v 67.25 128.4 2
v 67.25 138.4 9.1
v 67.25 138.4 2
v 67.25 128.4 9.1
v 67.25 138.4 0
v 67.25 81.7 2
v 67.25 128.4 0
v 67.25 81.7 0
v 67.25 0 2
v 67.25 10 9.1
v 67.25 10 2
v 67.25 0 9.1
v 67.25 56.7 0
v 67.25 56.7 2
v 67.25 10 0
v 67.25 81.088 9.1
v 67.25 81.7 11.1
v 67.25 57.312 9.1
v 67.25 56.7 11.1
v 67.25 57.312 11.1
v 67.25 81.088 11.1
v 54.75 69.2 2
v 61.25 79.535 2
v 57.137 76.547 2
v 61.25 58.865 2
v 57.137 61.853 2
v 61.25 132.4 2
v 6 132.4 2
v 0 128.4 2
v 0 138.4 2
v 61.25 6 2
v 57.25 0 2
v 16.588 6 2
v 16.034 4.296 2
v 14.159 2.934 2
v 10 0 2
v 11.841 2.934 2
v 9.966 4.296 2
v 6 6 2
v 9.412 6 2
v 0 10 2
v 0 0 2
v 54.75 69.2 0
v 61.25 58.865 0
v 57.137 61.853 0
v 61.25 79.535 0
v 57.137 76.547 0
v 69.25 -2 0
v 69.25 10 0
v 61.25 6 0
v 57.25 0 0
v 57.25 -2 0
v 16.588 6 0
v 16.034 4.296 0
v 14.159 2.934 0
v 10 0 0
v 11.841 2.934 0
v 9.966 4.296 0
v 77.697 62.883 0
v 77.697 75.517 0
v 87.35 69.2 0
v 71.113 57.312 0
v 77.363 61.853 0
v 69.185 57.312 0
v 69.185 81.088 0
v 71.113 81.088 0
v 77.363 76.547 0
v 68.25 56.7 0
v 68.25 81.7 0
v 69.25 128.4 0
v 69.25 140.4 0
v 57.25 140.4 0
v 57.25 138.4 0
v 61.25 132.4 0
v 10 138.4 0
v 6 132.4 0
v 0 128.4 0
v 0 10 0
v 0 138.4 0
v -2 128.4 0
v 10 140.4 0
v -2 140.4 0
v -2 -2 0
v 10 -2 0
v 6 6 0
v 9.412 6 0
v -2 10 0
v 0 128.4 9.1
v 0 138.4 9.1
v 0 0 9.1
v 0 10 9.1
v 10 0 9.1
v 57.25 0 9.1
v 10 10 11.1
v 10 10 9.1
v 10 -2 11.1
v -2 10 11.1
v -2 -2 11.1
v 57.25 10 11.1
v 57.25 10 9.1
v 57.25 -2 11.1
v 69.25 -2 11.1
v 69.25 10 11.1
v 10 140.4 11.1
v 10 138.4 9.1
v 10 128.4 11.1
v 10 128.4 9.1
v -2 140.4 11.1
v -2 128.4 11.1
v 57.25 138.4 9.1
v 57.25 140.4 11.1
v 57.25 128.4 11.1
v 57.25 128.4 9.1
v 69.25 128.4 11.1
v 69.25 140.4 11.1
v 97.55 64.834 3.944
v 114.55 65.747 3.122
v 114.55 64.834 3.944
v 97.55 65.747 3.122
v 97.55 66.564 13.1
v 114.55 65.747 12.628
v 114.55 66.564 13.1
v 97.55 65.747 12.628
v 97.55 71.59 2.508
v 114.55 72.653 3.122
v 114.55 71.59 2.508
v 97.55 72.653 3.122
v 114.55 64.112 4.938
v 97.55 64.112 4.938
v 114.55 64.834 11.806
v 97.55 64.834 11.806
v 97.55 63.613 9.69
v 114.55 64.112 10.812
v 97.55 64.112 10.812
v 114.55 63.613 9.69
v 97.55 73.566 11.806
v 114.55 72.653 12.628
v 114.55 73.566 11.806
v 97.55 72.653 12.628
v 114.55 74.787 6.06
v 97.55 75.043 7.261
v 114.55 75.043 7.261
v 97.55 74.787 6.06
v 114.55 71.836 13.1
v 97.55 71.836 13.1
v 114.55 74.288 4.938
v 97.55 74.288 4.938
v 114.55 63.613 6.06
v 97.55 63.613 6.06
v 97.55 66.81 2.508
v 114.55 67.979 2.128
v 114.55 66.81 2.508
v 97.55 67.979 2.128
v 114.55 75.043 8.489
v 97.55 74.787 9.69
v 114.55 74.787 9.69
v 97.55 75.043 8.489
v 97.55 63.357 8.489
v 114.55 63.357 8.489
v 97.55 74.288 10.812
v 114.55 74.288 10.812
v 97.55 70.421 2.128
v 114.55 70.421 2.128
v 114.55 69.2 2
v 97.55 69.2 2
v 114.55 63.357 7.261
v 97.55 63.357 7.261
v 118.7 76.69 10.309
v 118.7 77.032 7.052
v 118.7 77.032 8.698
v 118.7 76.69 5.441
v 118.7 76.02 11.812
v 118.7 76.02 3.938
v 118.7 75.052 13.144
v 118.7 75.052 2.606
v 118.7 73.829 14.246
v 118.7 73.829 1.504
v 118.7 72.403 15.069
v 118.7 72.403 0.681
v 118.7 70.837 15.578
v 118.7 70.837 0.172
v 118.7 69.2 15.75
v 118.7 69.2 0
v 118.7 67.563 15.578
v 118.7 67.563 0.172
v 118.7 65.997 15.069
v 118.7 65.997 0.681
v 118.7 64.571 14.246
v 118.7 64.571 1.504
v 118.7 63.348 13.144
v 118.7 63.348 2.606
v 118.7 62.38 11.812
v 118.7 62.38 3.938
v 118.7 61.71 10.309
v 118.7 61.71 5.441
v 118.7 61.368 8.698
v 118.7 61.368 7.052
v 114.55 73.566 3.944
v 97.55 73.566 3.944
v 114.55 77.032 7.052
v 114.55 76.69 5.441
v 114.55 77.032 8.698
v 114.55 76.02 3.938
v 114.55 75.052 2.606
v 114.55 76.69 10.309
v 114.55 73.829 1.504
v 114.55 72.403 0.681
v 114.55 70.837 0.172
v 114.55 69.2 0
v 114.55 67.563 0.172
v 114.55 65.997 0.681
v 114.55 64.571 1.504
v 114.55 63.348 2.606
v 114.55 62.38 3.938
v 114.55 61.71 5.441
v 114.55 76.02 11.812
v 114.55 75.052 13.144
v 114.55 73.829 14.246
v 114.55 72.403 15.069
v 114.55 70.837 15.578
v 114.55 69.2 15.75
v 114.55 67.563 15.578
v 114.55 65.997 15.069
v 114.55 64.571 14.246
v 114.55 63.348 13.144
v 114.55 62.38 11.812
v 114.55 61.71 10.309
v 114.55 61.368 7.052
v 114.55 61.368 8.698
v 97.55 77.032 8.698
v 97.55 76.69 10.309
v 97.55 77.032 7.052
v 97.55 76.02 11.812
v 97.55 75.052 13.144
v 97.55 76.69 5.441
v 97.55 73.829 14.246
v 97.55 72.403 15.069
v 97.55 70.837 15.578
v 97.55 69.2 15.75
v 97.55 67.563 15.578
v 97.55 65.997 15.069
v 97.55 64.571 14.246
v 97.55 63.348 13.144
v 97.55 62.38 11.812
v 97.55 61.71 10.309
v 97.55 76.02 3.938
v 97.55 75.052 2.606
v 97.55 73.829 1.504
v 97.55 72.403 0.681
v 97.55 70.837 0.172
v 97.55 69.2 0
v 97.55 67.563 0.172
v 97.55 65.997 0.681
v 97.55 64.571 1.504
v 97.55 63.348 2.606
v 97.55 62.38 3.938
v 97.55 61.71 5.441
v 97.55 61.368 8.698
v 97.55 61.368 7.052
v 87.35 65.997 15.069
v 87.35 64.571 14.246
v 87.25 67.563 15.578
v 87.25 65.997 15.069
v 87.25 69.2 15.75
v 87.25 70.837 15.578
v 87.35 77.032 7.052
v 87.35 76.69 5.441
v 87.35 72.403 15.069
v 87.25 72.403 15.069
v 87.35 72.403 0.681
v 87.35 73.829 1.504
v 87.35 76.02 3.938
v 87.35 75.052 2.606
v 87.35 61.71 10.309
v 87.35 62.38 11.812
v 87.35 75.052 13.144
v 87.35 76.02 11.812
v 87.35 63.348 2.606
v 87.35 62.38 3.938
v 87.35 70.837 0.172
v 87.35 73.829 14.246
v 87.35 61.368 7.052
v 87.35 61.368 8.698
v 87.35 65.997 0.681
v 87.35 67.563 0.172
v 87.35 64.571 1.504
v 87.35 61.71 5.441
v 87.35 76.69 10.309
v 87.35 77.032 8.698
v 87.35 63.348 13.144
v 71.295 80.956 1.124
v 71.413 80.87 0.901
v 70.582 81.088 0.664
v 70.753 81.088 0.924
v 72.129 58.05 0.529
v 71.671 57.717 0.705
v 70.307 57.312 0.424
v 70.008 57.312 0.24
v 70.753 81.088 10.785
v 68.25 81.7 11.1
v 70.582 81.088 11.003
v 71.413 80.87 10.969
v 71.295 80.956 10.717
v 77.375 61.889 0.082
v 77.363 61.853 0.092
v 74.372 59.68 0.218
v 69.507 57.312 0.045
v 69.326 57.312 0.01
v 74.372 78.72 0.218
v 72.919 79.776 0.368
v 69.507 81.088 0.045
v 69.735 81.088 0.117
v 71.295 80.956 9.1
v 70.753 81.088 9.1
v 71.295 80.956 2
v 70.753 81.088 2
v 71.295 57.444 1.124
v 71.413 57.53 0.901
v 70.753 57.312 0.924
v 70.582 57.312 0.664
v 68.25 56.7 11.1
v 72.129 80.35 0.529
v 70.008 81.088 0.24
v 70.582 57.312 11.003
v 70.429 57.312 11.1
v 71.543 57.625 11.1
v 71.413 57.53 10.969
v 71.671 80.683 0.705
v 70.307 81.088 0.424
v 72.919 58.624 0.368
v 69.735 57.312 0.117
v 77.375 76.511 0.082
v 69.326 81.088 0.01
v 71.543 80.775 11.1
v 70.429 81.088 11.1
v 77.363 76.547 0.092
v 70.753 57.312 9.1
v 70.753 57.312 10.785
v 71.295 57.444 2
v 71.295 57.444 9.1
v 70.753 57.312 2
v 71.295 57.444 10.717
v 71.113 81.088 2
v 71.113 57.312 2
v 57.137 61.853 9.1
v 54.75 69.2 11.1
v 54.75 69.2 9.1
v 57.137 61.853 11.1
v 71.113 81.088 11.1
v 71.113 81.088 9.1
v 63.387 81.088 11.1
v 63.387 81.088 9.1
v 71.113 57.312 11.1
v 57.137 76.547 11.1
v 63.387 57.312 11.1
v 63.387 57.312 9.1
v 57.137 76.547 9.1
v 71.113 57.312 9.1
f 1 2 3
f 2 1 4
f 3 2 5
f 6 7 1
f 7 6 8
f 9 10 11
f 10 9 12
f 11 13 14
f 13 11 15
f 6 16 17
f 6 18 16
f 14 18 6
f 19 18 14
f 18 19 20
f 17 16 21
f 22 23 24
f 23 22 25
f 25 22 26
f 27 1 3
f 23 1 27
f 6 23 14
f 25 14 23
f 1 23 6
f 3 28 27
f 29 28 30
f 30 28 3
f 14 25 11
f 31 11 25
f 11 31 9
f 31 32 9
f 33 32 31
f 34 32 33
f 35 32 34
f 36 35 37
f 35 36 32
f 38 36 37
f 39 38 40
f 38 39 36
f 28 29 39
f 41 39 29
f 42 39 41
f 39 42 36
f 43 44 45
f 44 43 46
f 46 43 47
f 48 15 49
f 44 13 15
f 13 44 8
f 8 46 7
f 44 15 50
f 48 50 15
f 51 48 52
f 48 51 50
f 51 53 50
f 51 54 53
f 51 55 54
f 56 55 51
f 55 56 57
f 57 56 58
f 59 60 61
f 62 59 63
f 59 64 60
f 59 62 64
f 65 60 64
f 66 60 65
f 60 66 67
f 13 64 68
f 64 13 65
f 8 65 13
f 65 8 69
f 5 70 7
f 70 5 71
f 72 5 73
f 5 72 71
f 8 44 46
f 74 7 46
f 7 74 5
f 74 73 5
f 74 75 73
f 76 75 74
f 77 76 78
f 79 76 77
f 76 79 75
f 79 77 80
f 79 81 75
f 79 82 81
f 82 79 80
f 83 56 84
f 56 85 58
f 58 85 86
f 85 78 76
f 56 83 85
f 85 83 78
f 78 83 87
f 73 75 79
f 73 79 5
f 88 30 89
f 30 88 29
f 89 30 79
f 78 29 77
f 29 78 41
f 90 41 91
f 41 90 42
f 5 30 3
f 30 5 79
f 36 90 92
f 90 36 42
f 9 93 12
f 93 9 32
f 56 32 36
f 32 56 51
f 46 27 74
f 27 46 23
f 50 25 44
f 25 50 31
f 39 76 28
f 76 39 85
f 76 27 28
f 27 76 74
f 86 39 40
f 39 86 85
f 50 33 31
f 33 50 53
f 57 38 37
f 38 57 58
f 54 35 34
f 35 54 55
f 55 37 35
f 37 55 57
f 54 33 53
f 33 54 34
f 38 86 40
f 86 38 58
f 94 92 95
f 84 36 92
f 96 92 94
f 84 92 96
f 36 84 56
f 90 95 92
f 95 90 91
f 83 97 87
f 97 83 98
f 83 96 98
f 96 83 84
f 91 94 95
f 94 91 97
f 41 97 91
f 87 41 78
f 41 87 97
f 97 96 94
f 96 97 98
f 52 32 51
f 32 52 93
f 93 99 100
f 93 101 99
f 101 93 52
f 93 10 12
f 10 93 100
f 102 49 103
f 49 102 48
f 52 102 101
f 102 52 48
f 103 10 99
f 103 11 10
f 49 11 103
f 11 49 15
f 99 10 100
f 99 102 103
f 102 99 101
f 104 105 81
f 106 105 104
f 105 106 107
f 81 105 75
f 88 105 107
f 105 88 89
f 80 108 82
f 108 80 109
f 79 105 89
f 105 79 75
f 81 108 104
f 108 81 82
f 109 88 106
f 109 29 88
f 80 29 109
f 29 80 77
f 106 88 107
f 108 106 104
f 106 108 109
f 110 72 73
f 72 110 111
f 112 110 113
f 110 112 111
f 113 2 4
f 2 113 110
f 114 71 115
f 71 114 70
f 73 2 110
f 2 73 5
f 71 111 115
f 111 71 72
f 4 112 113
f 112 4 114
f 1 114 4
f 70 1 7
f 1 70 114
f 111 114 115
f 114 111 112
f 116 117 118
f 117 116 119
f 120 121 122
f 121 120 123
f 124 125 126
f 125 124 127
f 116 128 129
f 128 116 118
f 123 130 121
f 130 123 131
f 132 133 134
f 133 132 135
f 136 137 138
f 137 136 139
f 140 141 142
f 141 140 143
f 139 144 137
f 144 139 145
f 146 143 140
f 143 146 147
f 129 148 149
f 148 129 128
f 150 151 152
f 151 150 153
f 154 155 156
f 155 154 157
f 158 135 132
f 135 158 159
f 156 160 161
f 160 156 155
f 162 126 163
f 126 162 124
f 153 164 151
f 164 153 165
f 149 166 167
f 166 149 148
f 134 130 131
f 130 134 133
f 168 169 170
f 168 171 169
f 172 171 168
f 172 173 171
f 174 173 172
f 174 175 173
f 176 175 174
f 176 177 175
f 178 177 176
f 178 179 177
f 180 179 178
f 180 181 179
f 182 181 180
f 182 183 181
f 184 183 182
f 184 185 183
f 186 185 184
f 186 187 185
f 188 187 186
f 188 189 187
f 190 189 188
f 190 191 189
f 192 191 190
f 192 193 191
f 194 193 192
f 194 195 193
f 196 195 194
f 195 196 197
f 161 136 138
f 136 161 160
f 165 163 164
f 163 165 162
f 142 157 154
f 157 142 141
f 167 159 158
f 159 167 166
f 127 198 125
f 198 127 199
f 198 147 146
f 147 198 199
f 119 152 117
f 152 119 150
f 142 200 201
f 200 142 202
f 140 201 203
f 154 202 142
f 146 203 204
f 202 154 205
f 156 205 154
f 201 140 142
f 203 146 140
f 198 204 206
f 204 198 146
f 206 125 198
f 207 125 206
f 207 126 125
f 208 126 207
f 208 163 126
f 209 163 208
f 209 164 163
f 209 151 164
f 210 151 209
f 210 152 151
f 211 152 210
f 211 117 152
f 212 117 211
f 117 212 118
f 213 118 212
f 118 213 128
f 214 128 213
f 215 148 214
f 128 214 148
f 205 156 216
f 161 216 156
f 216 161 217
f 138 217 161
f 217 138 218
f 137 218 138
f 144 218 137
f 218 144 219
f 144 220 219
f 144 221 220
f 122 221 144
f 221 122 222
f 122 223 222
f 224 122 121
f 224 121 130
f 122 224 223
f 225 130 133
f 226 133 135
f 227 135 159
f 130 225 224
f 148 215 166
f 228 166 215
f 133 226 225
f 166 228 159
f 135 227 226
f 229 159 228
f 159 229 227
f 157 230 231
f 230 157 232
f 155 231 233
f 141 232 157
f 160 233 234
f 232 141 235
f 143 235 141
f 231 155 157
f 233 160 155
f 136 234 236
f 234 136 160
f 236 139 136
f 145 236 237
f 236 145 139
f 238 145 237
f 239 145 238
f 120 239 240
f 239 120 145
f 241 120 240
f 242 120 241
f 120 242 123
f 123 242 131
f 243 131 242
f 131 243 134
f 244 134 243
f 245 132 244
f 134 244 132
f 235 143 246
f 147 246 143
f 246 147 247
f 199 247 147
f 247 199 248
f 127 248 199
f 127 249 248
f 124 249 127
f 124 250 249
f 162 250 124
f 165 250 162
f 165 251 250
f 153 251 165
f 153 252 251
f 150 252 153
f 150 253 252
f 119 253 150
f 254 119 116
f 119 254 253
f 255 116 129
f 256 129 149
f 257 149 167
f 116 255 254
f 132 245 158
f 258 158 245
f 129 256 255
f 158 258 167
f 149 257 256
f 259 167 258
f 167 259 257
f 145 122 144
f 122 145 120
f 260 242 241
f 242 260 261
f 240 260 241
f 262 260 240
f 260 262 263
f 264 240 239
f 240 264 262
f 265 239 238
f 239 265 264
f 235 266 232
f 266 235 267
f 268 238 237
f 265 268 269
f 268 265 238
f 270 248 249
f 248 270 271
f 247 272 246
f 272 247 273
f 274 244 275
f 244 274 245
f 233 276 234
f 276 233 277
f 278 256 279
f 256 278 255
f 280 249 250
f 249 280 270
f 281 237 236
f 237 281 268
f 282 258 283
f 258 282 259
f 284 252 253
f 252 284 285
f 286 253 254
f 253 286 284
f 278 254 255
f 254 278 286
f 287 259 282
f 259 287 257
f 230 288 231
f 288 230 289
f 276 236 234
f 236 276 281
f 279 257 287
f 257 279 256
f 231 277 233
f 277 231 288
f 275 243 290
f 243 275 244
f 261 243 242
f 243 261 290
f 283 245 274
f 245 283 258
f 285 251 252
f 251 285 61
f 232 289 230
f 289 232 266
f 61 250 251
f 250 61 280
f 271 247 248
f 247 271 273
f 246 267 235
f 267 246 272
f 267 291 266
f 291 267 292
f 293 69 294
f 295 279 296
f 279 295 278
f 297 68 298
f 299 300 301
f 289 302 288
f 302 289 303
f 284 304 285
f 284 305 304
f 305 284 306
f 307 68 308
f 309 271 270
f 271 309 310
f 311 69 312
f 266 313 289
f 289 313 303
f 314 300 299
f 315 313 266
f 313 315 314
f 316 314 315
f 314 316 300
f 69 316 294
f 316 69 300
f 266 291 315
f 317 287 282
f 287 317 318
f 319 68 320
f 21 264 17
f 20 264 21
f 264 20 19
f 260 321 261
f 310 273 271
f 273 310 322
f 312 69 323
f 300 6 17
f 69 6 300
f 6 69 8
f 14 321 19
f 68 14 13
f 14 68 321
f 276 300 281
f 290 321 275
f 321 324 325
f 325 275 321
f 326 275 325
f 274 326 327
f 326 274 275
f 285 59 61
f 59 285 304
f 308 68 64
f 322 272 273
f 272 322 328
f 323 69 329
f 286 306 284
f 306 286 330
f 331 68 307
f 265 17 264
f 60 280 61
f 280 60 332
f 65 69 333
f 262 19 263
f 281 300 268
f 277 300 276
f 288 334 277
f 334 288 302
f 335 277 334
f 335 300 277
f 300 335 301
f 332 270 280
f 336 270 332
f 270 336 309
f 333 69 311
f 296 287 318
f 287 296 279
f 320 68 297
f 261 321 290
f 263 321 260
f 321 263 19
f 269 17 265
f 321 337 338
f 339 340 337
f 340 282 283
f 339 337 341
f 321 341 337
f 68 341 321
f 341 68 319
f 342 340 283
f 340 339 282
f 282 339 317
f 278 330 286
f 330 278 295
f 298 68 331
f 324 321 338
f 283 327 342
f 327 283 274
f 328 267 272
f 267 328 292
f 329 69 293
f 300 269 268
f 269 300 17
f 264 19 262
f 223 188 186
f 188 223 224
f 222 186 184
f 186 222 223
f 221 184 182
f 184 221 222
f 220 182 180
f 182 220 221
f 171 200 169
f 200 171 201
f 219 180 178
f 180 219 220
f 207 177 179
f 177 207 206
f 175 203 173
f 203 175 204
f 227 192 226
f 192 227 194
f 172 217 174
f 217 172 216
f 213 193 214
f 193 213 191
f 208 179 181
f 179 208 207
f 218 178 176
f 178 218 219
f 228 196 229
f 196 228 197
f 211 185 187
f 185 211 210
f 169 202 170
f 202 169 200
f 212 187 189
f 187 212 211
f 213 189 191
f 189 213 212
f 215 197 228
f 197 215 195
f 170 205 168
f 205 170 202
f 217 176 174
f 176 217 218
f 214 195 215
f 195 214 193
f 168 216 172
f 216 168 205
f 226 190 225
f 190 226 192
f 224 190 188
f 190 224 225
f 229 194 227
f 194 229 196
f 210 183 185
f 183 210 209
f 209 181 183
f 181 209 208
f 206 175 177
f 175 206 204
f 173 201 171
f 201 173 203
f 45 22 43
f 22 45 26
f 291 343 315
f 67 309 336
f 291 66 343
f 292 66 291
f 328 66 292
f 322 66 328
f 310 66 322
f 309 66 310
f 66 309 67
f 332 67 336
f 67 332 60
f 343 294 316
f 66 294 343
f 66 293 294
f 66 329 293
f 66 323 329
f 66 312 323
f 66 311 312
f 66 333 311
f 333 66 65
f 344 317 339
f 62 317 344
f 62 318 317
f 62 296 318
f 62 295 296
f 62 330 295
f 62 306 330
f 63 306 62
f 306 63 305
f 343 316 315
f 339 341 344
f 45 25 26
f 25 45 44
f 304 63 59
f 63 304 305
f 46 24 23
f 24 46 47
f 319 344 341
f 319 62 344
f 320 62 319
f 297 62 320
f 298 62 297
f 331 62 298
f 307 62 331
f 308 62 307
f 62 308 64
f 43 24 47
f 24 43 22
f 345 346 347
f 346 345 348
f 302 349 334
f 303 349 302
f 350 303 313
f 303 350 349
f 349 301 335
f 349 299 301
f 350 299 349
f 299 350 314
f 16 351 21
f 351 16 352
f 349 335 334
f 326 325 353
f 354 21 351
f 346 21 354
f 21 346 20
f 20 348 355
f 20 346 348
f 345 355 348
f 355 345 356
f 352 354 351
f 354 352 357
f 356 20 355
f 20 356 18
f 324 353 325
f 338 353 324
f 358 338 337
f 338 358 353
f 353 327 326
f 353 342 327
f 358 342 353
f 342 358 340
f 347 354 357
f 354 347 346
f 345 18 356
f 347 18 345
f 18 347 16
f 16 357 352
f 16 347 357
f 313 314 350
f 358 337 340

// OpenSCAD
w = 67.25;
h = 138.4;
d = 7.1;

bt = 2;

$fn = 10;

module camera() {
    translate([13,6.5,bt/2]) {
        cylinder(d=7.5, h=1.1*bt, center=true);
    }
}

module back() {
    bw = 6;
    difference() {
        cube ([w,h,bt]);
        translate([bw,bw,-.05*bt])cube ([w-2*bw,h-2*bw,1.1*bt]);
        camera();
    }
}

module corner() {
    cw = 12;
    cr = 1;
    // minkowski() {
        translate([-bt,-bt,0]) {
            cube ([cw,bt,d+bt]);
            cube ([bt,cw,d+bt]);
            translate([0,0,d+bt])
                cube ([cw,cw,bt]);
        }
    // sphere(cr);
    // }
}
    
module frame() {
    back();
    translate([0,0,0])scale([1,1,1])corner();
    translate([w,0,0])scale([-1,1,1])corner();
    translate([0,h,0])scale([1,-1,1])corner();
    translate([w,h,0])scale([-1,-1,1])corner();
}


od = 15.75;
ol = 4.15;
id = 11.75;
il = 17.0;
fd = 11.1;
sl = 10.3;

cw = 25;
module axle () {
    ch = d+2*bt;
    cl = 1;
    co = 20;

    translate([od/2,-co,0]) {
        rotate([90,0,0]) {
            difference() {
                cylinder(d=id, h=sl+il+ol, $fn=30);
                translate([id/2-(id-fd),-il/2,sl])
                    cube([il,il,il]);
            }
            cylinder(d=od, h=sl, $fn=30);
            hull() {
                cylinder(d=od, h=0.1, $fn=30);
                translate([-od/2,-cw/2,-co])
                    cube([ch, cw, cl]);
            }
            translate([0,0,sl+il]) cylinder(d=od, h=ol, $fn=30);
        }
    }
}

module clip() {
    translate([w,h/2,0]) {
        rotate([0,-90,90]) {
            axle();
        }   
        cylinder(h=bt,d=cw);
        translate([0,0,d+bt]) cylinder(h=bt,d=cw);
    }
}

frame();
clip();
//axle();
